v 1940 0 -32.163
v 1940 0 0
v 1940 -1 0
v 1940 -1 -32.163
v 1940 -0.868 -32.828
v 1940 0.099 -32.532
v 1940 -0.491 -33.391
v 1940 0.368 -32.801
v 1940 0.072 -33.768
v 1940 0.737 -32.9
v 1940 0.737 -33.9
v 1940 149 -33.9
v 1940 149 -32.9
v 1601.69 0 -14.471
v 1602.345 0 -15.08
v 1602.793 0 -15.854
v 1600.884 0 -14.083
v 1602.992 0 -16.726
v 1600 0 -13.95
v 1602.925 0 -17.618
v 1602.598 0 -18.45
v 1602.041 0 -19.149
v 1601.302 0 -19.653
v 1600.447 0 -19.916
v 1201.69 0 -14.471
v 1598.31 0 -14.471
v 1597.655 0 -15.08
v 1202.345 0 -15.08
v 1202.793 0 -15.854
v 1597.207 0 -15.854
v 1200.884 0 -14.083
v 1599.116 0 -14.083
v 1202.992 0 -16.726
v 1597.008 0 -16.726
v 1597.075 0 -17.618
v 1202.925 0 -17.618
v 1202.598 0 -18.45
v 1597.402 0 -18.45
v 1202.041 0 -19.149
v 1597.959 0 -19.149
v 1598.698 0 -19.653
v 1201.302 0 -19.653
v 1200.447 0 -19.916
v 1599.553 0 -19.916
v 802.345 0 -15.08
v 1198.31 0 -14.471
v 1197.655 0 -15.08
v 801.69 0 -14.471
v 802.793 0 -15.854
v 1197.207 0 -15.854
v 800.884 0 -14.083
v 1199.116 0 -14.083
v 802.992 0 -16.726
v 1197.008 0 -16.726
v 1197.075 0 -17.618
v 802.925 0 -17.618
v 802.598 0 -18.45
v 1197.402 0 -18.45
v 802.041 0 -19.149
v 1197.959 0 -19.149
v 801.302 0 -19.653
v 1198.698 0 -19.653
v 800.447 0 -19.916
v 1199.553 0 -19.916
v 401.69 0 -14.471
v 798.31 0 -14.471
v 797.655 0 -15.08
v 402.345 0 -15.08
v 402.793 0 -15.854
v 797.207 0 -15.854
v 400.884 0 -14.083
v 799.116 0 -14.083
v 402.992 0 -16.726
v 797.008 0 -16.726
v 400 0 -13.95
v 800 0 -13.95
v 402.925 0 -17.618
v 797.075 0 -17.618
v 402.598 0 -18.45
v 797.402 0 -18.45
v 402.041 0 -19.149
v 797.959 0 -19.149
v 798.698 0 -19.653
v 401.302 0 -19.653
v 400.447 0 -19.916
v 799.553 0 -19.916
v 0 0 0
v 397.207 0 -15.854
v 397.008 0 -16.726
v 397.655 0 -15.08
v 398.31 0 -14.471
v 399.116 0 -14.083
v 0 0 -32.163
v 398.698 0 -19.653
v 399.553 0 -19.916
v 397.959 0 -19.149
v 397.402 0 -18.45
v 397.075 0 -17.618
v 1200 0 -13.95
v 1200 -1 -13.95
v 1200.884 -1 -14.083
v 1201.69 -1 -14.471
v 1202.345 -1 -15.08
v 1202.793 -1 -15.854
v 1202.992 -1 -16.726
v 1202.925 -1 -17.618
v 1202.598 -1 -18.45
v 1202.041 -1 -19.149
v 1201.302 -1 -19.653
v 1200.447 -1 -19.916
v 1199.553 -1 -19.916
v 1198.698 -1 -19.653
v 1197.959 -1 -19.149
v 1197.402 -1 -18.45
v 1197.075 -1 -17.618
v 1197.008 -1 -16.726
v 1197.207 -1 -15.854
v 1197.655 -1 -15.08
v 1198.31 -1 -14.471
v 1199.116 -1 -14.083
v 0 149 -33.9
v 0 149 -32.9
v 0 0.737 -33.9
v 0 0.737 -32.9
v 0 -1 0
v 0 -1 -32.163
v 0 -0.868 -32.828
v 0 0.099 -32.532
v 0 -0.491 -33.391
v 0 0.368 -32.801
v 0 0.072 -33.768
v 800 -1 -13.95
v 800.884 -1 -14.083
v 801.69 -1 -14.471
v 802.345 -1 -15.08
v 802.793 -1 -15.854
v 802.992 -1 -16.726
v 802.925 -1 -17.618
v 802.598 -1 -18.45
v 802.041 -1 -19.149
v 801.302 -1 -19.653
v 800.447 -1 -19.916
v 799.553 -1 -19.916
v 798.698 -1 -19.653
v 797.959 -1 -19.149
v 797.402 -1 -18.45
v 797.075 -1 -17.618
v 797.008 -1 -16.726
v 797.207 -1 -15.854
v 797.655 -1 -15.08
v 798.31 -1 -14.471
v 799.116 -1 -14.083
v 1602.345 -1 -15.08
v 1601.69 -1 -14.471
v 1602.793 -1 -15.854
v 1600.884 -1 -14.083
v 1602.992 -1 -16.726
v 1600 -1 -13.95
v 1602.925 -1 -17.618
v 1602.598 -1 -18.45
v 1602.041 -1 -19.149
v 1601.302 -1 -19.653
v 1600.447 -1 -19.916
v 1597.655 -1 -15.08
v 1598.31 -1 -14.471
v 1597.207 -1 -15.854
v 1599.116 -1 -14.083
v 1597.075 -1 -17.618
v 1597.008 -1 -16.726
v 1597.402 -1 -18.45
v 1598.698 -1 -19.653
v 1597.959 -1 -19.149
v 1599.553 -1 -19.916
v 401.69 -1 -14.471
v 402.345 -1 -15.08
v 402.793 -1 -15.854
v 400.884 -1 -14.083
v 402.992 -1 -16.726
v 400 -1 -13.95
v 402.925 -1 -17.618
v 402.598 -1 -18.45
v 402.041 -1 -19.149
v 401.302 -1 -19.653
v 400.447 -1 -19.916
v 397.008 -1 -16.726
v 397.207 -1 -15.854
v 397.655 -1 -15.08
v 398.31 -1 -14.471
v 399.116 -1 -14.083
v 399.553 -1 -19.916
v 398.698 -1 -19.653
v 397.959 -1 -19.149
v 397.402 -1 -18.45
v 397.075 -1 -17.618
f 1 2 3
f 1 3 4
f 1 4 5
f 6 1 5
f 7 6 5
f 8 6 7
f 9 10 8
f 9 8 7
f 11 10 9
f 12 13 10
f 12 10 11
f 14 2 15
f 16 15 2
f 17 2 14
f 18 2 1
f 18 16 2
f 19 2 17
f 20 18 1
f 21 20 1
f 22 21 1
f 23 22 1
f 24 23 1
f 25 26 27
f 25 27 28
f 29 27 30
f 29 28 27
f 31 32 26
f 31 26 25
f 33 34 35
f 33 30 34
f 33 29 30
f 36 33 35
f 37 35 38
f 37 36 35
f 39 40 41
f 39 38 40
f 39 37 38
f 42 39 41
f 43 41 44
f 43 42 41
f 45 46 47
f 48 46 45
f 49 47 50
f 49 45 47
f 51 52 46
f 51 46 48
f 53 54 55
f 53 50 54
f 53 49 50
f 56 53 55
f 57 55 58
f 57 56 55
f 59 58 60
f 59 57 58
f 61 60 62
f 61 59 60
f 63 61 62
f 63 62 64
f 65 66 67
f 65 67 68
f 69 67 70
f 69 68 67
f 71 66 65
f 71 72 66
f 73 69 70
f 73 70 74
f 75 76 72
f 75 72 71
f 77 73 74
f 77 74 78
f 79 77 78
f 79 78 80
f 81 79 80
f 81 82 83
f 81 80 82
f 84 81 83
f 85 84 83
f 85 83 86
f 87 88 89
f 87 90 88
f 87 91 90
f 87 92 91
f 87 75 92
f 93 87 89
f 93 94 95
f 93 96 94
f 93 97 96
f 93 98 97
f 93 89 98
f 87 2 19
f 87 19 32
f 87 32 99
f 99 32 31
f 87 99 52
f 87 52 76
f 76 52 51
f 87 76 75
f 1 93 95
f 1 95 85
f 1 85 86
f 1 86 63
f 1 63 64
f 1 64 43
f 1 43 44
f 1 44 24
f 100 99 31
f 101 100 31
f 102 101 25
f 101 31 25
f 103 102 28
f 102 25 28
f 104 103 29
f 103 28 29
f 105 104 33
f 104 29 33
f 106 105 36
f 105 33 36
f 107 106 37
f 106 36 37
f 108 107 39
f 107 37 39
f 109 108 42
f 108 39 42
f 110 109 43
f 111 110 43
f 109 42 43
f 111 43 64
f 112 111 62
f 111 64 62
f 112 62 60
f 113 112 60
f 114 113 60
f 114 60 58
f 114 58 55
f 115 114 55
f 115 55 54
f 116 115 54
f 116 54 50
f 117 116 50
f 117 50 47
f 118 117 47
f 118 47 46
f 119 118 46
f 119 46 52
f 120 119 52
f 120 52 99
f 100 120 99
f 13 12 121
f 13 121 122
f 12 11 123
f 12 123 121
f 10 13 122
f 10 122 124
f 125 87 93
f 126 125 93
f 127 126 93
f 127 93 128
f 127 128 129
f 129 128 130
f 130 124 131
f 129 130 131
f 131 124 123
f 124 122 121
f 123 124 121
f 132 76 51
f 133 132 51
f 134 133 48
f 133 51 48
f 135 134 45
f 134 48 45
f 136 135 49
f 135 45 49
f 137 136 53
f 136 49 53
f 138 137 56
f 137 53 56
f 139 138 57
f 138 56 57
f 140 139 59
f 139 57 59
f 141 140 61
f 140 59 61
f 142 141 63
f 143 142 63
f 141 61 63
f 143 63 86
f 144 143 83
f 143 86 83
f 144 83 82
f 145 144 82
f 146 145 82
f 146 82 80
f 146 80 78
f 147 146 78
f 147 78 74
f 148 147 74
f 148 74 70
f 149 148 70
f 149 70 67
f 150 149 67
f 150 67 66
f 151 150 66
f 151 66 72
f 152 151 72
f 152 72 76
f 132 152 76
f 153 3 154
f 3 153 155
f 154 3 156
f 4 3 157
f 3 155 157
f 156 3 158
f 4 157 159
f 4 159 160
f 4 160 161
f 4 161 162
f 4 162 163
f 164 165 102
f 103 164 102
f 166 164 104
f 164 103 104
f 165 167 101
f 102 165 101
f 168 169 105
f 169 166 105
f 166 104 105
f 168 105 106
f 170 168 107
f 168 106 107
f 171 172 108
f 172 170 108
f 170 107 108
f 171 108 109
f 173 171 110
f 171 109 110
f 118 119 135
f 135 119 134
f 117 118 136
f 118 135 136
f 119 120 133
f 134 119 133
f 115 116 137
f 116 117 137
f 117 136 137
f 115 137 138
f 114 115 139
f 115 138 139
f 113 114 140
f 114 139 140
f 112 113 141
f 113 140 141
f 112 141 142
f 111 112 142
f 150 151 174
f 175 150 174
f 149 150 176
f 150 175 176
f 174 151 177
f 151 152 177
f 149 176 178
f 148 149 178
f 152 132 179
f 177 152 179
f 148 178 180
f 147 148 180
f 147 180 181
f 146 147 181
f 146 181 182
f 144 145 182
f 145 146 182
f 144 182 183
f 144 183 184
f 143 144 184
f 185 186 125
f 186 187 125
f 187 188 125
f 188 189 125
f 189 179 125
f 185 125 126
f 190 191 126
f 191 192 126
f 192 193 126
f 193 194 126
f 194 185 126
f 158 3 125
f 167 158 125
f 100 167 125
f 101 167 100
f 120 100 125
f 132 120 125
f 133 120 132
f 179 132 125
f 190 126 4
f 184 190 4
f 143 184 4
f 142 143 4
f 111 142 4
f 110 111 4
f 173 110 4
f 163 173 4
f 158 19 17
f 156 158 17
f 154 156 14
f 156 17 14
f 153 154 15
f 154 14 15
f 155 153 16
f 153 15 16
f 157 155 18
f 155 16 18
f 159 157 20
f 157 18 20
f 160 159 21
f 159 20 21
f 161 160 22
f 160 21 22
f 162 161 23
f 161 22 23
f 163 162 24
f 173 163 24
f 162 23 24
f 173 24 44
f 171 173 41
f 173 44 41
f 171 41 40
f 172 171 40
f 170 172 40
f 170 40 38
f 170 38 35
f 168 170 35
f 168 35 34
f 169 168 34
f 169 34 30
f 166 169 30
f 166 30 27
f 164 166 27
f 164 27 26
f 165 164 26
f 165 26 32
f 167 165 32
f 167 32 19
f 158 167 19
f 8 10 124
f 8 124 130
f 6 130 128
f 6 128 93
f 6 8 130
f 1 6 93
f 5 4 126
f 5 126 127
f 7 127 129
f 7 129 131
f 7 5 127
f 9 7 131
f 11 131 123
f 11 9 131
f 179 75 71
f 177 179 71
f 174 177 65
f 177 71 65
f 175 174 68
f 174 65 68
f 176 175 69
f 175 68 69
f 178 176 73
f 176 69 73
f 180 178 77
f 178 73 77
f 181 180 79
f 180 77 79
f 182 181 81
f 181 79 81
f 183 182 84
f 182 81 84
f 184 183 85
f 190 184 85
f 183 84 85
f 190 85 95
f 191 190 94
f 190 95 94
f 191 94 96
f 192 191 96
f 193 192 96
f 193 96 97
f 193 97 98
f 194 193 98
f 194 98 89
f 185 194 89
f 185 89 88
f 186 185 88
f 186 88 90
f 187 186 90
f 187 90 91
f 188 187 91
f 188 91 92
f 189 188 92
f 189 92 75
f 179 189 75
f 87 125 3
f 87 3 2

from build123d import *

# Parameters (mm, degrees)
SKETCH2_W                    = 33.9
SKETCH2_H                    = 1
BASE_FLANGE1_DEPTH           = 1940
EDGE_FLANGE2_STRIP_W         = 5.4732
EDGE_FLANGE2_STRIP_H         = 1
EDGE_FLANGE2_STRIP_CUT_DEPTH = 1940
EDGE_FLANGE2_DEPTH           = 1940
SKETCH10_R                   = 3
CUT_EXTRUDE1_DEPTH           = 10
SKETCH10_3_R                 = 3
CUT_EXTRUDE2_DEPTH           = 10


# Sheet-metal steps are written as plain solids
with BuildPart() as part:
    # Sketch2 → Base-Flange1 (new body)
    with BuildSketch(Plane(origin=(0, 0, 0), x_dir=(0, 0, -1), z_dir=(1, 0, 0))):
        with Locations((16.95, -0.5)):
            Rectangle(SKETCH2_W, SKETCH2_H)
    extrude(amount=BASE_FLANGE1_DEPTH)

    # Edge-Flange2 strip (across the edge) → Edge-Flange2 strip cut (cut)
    with BuildSketch(Plane(origin=(1940, 0, -33.9), x_dir=(0, 0, 1), z_dir=(-1, 0, 0))):
        with Locations((-1, -0.5)):
            Rectangle(EDGE_FLANGE2_STRIP_W, EDGE_FLANGE2_STRIP_H)
    extrude(amount=EDGE_FLANGE2_STRIP_CUT_DEPTH, mode=Mode.SUBTRACT)

    # Edge-Flange2 section (across the edge) → Edge-Flange2 (add)
    with BuildSketch(Plane(origin=(1940, 0, -33.9), x_dir=(0, 0, 1), z_dir=(-1, 0, 0))):
        with BuildLine():
            Line((0, 0.7366), (0, 149))
            Line((0, 149), (1, 149))
            Line((1, 149), (1, 0.7366))
            ThreePointArc((1, 0.7366), (1.215745145, 0.215745145), (1.7366, 0))
            Line((1.7366, 0), (1.7366, -1))
            ThreePointArc((1.7366, -1), (0.508638364, -0.491361636), (0, 0.7366))
        make_face()
    extrude(amount=EDGE_FLANGE2_DEPTH)

    # Sketch10 → Cut-Extrude1 (cut)
    with BuildSketch(Plane(origin=(0, 0, 0), x_dir=(1, 0, 0), z_dir=(0, 1, 0))):
        with Locations(Location((800, 16.95, 0), (0, 0, 270))):
            Circle(SKETCH10_R)
    extrude(amount=-CUT_EXTRUDE1_DEPTH, mode=Mode.SUBTRACT)

    # Sketch10<3> → Cut-Extrude2 (cut)
    with BuildSketch(Plane(origin=(0, 0, 0), x_dir=(1, 0, 0), z_dir=(0, 1, 0))):
        with Locations(Location((400, 16.95, 0), (0, 0, 270))):
            Circle(SKETCH10_3_R)
        with Locations(Location((800, 16.95, 0), (0, 0, 270))):
            Circle(SKETCH10_3_R)
        with Locations(Location((1200, 16.95, 0), (0, 0, 270))):
            Circle(SKETCH10_3_R)
        with Locations(Location((1600, 16.95, 0), (0, 0, 270))):
            Circle(SKETCH10_3_R)
    extrude(amount=-CUT_EXTRUDE2_DEPTH, mode=Mode.SUBTRACT)


solid = part.part
